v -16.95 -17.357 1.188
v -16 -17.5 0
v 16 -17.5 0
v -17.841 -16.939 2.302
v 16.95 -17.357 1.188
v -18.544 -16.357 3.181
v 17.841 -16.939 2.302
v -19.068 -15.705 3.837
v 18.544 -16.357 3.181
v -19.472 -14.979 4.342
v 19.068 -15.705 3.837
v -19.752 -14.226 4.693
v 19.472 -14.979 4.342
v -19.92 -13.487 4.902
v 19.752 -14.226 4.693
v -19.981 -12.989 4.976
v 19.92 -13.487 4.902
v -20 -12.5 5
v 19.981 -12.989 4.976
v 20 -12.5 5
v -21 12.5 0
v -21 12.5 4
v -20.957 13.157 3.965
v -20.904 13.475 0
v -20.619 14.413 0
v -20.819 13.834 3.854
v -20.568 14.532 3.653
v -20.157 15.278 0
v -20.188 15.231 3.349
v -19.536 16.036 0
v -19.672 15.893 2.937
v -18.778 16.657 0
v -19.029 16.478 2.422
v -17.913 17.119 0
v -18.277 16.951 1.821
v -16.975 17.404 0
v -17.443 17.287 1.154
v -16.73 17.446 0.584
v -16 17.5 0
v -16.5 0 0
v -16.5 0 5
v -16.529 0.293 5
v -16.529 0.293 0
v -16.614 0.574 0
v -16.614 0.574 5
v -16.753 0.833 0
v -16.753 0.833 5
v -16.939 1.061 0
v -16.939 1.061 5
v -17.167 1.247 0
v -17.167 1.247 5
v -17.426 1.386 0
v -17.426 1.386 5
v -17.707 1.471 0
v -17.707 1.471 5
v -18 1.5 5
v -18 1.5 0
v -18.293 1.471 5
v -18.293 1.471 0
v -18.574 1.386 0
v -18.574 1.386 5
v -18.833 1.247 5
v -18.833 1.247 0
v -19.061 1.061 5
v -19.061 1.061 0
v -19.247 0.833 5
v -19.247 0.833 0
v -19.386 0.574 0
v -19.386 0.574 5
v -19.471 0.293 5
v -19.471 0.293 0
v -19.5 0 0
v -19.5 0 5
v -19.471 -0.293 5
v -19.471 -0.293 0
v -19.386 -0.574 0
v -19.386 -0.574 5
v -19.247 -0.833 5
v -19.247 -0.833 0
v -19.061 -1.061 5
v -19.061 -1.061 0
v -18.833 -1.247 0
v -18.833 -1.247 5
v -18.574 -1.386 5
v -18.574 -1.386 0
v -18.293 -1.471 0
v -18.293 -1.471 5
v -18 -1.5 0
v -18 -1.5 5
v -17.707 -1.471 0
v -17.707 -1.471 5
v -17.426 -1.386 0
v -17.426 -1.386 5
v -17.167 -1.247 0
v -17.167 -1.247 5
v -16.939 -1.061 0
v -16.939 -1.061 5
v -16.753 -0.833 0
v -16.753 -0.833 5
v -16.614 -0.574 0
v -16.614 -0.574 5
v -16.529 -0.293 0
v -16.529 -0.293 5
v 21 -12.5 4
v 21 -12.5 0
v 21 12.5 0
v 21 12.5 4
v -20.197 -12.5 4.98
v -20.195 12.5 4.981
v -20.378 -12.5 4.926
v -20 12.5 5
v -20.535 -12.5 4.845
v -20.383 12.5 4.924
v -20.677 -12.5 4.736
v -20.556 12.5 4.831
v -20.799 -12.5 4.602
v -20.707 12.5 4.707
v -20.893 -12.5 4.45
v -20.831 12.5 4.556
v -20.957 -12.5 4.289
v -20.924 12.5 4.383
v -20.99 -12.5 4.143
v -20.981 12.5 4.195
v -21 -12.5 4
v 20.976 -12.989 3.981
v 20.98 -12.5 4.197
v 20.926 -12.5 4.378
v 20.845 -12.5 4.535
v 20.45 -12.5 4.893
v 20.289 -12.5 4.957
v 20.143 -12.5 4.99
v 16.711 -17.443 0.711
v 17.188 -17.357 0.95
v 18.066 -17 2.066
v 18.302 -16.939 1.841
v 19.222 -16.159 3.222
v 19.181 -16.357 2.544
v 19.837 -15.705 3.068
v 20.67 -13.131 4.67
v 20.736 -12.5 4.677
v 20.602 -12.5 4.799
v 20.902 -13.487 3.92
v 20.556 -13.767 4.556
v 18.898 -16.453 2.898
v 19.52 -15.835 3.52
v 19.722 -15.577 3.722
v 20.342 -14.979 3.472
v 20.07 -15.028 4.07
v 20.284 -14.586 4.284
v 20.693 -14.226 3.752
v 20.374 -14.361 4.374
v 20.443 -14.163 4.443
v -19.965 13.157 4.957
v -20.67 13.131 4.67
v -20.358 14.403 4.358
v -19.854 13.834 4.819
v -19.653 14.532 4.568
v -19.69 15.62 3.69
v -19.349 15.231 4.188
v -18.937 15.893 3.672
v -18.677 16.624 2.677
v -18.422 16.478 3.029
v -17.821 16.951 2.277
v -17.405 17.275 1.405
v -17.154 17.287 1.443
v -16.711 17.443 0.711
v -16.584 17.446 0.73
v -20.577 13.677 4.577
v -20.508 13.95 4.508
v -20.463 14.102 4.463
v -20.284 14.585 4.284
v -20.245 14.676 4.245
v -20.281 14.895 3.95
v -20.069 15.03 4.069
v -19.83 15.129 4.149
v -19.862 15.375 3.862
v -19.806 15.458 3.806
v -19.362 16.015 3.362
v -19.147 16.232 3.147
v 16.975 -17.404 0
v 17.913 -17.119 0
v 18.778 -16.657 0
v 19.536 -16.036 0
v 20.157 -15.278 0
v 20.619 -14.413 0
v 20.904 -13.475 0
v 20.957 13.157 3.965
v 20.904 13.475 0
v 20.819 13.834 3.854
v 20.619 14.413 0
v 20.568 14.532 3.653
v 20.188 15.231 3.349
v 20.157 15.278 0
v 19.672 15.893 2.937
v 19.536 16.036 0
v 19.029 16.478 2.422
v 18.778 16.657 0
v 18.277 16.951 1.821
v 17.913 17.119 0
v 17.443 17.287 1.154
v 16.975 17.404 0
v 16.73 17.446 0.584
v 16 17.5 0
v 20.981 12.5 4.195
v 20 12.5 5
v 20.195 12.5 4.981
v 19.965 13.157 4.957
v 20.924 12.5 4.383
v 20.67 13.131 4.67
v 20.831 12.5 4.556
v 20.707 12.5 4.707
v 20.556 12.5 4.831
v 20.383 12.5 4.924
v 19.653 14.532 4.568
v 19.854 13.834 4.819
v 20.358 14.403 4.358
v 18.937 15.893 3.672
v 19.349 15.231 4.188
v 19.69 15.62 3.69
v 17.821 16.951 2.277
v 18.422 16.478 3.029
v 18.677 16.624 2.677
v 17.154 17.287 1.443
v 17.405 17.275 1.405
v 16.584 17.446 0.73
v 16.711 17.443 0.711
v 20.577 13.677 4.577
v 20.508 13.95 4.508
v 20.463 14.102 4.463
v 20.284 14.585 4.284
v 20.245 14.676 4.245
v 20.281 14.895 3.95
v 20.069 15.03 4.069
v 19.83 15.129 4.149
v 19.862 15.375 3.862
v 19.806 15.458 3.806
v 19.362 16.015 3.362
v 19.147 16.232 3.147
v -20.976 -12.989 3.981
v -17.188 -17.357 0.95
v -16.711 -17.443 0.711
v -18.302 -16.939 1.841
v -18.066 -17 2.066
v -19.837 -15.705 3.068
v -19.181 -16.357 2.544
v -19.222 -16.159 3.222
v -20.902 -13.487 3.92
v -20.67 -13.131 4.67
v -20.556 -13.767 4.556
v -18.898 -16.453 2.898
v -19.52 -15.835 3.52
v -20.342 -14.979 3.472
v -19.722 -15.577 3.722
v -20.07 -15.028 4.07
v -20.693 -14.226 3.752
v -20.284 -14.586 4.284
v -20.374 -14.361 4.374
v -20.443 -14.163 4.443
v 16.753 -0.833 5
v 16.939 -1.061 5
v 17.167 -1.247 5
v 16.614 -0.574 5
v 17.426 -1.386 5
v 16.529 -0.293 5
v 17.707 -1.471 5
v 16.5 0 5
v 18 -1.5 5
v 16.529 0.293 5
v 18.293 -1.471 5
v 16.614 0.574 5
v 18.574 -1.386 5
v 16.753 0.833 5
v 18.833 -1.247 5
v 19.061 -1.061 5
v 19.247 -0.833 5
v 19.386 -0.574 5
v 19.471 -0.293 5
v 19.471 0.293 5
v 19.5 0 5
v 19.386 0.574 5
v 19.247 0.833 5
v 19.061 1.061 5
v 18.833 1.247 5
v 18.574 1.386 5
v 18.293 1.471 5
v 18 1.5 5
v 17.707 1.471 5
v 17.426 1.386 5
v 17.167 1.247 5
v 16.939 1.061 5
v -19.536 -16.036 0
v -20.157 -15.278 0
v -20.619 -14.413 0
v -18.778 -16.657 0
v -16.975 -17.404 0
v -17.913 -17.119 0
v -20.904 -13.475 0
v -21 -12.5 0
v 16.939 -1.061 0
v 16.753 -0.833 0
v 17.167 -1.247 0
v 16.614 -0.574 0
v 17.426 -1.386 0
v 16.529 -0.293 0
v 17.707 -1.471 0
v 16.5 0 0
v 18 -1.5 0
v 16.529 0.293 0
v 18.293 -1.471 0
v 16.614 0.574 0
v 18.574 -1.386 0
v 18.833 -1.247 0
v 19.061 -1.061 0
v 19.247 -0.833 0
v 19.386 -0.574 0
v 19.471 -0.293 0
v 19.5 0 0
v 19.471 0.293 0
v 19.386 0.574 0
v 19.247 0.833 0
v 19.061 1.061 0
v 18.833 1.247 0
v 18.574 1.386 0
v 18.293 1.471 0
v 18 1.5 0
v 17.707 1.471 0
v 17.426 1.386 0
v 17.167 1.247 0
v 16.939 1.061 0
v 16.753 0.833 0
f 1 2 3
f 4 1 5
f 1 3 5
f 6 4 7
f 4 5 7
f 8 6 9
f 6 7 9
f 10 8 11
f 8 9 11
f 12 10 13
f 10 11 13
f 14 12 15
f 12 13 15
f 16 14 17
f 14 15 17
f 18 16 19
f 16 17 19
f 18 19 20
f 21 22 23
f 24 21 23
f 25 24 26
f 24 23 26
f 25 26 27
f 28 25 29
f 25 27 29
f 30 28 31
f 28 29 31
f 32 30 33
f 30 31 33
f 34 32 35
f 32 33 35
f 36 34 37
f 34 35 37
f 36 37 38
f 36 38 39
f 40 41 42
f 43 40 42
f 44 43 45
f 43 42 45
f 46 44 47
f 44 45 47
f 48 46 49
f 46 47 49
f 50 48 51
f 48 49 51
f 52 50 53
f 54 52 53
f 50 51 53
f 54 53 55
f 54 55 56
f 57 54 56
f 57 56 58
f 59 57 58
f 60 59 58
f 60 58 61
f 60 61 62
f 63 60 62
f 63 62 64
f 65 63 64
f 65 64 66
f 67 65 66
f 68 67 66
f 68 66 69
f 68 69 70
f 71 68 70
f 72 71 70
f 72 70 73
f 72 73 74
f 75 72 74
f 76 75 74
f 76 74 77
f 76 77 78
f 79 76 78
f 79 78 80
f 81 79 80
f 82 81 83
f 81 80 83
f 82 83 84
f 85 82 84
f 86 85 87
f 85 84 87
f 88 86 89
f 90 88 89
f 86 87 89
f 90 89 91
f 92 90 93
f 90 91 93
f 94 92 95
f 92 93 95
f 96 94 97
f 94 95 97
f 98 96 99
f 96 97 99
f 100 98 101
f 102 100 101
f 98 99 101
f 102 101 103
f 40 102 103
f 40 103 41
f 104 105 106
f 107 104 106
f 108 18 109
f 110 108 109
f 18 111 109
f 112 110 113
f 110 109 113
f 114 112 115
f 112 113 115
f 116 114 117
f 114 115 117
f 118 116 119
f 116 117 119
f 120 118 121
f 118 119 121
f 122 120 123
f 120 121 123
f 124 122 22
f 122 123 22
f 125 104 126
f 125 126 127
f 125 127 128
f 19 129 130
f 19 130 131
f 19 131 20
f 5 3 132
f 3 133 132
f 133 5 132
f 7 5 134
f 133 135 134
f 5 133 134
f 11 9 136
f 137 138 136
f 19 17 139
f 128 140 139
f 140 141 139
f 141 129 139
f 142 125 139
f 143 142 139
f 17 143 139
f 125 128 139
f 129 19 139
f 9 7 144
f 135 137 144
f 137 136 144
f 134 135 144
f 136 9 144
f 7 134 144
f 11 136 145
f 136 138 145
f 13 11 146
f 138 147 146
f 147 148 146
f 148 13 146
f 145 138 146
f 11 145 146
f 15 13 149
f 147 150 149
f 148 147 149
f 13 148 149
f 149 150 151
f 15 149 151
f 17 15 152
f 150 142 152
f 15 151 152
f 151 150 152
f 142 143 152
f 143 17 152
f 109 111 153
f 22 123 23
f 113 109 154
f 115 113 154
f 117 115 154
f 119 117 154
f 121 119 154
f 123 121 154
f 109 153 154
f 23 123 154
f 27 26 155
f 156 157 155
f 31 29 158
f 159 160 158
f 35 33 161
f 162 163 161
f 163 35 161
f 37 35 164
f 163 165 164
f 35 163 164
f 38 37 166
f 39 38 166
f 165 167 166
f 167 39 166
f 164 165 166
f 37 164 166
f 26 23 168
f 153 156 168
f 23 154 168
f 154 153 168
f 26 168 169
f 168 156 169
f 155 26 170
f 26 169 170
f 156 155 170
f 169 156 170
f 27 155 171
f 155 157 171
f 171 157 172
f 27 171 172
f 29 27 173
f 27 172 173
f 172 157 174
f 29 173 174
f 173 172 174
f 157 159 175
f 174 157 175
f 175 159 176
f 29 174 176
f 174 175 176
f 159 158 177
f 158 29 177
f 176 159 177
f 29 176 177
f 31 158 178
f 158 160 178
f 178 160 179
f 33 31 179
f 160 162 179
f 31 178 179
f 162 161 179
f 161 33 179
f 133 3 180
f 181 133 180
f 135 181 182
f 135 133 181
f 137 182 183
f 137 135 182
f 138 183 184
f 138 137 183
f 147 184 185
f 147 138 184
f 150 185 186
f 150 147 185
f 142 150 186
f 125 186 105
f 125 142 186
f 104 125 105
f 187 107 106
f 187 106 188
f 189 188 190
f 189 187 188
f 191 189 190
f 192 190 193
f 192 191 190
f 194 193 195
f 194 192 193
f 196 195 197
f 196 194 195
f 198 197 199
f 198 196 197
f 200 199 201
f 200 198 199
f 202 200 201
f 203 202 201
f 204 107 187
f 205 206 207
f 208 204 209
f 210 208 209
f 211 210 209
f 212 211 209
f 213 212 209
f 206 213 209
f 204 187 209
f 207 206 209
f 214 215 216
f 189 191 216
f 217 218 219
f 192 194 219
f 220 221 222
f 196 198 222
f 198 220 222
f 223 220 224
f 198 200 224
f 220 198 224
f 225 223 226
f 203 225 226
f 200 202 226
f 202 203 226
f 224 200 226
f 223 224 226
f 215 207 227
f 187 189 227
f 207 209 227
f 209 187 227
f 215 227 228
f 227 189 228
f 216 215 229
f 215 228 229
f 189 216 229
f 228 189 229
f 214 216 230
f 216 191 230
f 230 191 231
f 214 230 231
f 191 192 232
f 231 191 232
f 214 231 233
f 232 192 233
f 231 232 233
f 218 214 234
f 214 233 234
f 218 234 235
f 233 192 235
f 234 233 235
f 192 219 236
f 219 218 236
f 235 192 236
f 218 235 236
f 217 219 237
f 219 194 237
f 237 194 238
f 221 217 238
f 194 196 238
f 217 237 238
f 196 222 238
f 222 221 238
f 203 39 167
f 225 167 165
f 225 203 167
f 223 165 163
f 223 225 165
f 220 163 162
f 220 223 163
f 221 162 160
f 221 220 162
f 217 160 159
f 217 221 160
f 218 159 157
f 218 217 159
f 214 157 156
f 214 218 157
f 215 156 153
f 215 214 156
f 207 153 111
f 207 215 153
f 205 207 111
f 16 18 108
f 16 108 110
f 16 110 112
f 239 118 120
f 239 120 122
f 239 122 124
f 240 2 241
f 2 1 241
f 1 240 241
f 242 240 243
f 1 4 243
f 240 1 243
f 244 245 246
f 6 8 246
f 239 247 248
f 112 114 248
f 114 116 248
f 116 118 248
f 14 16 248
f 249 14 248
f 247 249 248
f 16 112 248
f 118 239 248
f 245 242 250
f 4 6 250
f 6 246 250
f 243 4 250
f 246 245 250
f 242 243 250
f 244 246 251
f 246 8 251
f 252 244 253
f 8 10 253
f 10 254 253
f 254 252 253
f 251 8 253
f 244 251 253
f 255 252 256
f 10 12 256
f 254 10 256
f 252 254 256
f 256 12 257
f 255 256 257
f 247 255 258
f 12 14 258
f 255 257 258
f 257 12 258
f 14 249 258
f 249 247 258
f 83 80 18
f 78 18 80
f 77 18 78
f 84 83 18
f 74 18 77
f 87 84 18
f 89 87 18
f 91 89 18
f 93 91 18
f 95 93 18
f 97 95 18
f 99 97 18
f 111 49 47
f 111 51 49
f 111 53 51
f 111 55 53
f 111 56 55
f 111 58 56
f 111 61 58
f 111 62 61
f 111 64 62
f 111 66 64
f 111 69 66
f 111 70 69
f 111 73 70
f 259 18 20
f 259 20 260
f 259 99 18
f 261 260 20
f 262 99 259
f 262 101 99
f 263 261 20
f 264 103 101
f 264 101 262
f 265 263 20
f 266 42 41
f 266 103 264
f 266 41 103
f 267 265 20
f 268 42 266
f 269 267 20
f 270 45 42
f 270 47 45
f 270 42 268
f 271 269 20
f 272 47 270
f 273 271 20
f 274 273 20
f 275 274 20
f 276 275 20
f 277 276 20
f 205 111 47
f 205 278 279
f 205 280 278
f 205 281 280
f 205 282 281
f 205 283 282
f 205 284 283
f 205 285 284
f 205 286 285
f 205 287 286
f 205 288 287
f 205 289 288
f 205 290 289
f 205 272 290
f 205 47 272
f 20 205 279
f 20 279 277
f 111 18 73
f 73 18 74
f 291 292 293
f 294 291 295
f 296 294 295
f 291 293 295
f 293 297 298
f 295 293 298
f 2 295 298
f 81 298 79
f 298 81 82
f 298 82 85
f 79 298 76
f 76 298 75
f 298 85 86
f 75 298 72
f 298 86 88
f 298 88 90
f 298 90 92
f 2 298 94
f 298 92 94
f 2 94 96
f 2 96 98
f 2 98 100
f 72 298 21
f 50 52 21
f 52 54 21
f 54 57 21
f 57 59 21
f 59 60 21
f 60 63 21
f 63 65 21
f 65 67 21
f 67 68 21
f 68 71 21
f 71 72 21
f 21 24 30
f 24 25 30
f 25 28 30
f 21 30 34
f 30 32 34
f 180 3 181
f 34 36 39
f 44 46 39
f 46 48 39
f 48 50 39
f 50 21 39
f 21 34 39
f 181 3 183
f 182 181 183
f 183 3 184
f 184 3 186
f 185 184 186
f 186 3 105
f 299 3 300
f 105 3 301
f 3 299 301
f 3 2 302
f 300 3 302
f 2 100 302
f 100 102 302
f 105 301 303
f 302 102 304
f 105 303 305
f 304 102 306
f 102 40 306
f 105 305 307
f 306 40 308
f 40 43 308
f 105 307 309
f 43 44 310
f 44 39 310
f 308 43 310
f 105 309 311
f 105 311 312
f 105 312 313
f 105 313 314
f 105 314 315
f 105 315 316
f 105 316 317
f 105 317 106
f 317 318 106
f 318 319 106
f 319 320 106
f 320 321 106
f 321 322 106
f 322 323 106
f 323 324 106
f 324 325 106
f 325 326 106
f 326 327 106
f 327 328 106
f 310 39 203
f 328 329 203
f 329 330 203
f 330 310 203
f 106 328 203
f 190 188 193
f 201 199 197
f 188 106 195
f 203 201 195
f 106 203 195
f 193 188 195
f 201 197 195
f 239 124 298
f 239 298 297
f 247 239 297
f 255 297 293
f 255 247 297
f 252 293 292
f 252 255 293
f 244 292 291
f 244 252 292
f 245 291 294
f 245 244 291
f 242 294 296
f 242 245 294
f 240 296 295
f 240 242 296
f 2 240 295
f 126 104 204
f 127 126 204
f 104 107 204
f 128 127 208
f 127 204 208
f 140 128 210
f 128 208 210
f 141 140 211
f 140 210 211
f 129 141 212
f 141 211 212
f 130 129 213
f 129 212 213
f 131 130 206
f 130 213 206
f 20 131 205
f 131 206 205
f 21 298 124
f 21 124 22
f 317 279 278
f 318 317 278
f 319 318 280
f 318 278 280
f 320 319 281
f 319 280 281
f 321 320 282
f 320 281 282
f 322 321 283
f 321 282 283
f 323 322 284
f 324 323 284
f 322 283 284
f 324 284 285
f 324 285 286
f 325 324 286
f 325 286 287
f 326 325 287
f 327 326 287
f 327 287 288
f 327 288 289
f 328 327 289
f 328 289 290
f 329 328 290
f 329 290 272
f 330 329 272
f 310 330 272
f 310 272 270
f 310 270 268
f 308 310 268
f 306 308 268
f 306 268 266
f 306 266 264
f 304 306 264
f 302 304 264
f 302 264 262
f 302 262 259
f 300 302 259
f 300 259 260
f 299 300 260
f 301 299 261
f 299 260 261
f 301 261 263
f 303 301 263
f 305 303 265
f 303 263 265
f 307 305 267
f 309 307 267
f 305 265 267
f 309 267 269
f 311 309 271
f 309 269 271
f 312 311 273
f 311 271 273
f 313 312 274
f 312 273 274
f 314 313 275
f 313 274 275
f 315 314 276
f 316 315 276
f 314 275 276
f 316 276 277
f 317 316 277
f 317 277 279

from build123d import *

# Parameters (mm, degrees)
F0_W     = 42
F0_H     = 35
F1_DEPTH = 5
F2_R     = 4.99999
F3_R     = 1.5
F4_DEPTH = 6
F5_F1_R  = 1
F5_F2_R  = 1


# Not quite as in the source:
# - a fillet or chamfer is up to 0.001 mm smaller than in the source, because OpenCascade refuses the exact size


with BuildPart() as f1:
    # F0 (on Top) → F1 (new body)
    with BuildSketch(Plane.XY):
        Rectangle(F0_W, F0_H)
    extrude(amount=F1_DEPTH)

    # F2 (radius 5 in the source; OpenCascade refuses exactly that, so slightly less here)
    f2_edges = [f1.edges().sort_by_distance(p)[0] for p in [
        (-21, -17.5, 2.5),
        (21, -17.5, 2.5),
        (-21, 17.5, 2.5),
        (21, 17.5, 2.5),
        (0, 17.5, 5),
        (0, -17.5, 5),
    ]]
    fillet(f2_edges, radius=F2_R)

    # F3 (on face) → F4 (cut)
    with BuildSketch(Plane.XY.offset(5)):
        with Locations((-18, 0)):
            Circle(F3_R)
        with Locations((18, 0)):
            Circle(F3_R)
    extrude(amount=-F4_DEPTH, mode=Mode.SUBTRACT)

    # F5: fillet of radius 1 on 2 edges, made by hand

    # F5_f1
    f5_f1_edges = [f1.edges().sort_by_distance(p)[0] for p in [
        (19.5355368349, 16.0355368349, 3.5355368349),
        (21, 0, 5),
        (19.5355368349, -16.0355368349, 3.5355368349),
    ]]
    fillet(f5_f1_edges, radius=F5_F1_R)

    # F5_f2
    f5_f2_edges = [f1.edges().sort_by_distance(p)[0] for p in [
        (-19.5355368349, 16.0355368349, 3.5355368349),
        (-21, 0, 5),
        (-19.5355368349, -16.0355368349, 3.5355368349),
    ]]
    fillet(f5_f2_edges, radius=F5_F2_R)


solid = f1.part
